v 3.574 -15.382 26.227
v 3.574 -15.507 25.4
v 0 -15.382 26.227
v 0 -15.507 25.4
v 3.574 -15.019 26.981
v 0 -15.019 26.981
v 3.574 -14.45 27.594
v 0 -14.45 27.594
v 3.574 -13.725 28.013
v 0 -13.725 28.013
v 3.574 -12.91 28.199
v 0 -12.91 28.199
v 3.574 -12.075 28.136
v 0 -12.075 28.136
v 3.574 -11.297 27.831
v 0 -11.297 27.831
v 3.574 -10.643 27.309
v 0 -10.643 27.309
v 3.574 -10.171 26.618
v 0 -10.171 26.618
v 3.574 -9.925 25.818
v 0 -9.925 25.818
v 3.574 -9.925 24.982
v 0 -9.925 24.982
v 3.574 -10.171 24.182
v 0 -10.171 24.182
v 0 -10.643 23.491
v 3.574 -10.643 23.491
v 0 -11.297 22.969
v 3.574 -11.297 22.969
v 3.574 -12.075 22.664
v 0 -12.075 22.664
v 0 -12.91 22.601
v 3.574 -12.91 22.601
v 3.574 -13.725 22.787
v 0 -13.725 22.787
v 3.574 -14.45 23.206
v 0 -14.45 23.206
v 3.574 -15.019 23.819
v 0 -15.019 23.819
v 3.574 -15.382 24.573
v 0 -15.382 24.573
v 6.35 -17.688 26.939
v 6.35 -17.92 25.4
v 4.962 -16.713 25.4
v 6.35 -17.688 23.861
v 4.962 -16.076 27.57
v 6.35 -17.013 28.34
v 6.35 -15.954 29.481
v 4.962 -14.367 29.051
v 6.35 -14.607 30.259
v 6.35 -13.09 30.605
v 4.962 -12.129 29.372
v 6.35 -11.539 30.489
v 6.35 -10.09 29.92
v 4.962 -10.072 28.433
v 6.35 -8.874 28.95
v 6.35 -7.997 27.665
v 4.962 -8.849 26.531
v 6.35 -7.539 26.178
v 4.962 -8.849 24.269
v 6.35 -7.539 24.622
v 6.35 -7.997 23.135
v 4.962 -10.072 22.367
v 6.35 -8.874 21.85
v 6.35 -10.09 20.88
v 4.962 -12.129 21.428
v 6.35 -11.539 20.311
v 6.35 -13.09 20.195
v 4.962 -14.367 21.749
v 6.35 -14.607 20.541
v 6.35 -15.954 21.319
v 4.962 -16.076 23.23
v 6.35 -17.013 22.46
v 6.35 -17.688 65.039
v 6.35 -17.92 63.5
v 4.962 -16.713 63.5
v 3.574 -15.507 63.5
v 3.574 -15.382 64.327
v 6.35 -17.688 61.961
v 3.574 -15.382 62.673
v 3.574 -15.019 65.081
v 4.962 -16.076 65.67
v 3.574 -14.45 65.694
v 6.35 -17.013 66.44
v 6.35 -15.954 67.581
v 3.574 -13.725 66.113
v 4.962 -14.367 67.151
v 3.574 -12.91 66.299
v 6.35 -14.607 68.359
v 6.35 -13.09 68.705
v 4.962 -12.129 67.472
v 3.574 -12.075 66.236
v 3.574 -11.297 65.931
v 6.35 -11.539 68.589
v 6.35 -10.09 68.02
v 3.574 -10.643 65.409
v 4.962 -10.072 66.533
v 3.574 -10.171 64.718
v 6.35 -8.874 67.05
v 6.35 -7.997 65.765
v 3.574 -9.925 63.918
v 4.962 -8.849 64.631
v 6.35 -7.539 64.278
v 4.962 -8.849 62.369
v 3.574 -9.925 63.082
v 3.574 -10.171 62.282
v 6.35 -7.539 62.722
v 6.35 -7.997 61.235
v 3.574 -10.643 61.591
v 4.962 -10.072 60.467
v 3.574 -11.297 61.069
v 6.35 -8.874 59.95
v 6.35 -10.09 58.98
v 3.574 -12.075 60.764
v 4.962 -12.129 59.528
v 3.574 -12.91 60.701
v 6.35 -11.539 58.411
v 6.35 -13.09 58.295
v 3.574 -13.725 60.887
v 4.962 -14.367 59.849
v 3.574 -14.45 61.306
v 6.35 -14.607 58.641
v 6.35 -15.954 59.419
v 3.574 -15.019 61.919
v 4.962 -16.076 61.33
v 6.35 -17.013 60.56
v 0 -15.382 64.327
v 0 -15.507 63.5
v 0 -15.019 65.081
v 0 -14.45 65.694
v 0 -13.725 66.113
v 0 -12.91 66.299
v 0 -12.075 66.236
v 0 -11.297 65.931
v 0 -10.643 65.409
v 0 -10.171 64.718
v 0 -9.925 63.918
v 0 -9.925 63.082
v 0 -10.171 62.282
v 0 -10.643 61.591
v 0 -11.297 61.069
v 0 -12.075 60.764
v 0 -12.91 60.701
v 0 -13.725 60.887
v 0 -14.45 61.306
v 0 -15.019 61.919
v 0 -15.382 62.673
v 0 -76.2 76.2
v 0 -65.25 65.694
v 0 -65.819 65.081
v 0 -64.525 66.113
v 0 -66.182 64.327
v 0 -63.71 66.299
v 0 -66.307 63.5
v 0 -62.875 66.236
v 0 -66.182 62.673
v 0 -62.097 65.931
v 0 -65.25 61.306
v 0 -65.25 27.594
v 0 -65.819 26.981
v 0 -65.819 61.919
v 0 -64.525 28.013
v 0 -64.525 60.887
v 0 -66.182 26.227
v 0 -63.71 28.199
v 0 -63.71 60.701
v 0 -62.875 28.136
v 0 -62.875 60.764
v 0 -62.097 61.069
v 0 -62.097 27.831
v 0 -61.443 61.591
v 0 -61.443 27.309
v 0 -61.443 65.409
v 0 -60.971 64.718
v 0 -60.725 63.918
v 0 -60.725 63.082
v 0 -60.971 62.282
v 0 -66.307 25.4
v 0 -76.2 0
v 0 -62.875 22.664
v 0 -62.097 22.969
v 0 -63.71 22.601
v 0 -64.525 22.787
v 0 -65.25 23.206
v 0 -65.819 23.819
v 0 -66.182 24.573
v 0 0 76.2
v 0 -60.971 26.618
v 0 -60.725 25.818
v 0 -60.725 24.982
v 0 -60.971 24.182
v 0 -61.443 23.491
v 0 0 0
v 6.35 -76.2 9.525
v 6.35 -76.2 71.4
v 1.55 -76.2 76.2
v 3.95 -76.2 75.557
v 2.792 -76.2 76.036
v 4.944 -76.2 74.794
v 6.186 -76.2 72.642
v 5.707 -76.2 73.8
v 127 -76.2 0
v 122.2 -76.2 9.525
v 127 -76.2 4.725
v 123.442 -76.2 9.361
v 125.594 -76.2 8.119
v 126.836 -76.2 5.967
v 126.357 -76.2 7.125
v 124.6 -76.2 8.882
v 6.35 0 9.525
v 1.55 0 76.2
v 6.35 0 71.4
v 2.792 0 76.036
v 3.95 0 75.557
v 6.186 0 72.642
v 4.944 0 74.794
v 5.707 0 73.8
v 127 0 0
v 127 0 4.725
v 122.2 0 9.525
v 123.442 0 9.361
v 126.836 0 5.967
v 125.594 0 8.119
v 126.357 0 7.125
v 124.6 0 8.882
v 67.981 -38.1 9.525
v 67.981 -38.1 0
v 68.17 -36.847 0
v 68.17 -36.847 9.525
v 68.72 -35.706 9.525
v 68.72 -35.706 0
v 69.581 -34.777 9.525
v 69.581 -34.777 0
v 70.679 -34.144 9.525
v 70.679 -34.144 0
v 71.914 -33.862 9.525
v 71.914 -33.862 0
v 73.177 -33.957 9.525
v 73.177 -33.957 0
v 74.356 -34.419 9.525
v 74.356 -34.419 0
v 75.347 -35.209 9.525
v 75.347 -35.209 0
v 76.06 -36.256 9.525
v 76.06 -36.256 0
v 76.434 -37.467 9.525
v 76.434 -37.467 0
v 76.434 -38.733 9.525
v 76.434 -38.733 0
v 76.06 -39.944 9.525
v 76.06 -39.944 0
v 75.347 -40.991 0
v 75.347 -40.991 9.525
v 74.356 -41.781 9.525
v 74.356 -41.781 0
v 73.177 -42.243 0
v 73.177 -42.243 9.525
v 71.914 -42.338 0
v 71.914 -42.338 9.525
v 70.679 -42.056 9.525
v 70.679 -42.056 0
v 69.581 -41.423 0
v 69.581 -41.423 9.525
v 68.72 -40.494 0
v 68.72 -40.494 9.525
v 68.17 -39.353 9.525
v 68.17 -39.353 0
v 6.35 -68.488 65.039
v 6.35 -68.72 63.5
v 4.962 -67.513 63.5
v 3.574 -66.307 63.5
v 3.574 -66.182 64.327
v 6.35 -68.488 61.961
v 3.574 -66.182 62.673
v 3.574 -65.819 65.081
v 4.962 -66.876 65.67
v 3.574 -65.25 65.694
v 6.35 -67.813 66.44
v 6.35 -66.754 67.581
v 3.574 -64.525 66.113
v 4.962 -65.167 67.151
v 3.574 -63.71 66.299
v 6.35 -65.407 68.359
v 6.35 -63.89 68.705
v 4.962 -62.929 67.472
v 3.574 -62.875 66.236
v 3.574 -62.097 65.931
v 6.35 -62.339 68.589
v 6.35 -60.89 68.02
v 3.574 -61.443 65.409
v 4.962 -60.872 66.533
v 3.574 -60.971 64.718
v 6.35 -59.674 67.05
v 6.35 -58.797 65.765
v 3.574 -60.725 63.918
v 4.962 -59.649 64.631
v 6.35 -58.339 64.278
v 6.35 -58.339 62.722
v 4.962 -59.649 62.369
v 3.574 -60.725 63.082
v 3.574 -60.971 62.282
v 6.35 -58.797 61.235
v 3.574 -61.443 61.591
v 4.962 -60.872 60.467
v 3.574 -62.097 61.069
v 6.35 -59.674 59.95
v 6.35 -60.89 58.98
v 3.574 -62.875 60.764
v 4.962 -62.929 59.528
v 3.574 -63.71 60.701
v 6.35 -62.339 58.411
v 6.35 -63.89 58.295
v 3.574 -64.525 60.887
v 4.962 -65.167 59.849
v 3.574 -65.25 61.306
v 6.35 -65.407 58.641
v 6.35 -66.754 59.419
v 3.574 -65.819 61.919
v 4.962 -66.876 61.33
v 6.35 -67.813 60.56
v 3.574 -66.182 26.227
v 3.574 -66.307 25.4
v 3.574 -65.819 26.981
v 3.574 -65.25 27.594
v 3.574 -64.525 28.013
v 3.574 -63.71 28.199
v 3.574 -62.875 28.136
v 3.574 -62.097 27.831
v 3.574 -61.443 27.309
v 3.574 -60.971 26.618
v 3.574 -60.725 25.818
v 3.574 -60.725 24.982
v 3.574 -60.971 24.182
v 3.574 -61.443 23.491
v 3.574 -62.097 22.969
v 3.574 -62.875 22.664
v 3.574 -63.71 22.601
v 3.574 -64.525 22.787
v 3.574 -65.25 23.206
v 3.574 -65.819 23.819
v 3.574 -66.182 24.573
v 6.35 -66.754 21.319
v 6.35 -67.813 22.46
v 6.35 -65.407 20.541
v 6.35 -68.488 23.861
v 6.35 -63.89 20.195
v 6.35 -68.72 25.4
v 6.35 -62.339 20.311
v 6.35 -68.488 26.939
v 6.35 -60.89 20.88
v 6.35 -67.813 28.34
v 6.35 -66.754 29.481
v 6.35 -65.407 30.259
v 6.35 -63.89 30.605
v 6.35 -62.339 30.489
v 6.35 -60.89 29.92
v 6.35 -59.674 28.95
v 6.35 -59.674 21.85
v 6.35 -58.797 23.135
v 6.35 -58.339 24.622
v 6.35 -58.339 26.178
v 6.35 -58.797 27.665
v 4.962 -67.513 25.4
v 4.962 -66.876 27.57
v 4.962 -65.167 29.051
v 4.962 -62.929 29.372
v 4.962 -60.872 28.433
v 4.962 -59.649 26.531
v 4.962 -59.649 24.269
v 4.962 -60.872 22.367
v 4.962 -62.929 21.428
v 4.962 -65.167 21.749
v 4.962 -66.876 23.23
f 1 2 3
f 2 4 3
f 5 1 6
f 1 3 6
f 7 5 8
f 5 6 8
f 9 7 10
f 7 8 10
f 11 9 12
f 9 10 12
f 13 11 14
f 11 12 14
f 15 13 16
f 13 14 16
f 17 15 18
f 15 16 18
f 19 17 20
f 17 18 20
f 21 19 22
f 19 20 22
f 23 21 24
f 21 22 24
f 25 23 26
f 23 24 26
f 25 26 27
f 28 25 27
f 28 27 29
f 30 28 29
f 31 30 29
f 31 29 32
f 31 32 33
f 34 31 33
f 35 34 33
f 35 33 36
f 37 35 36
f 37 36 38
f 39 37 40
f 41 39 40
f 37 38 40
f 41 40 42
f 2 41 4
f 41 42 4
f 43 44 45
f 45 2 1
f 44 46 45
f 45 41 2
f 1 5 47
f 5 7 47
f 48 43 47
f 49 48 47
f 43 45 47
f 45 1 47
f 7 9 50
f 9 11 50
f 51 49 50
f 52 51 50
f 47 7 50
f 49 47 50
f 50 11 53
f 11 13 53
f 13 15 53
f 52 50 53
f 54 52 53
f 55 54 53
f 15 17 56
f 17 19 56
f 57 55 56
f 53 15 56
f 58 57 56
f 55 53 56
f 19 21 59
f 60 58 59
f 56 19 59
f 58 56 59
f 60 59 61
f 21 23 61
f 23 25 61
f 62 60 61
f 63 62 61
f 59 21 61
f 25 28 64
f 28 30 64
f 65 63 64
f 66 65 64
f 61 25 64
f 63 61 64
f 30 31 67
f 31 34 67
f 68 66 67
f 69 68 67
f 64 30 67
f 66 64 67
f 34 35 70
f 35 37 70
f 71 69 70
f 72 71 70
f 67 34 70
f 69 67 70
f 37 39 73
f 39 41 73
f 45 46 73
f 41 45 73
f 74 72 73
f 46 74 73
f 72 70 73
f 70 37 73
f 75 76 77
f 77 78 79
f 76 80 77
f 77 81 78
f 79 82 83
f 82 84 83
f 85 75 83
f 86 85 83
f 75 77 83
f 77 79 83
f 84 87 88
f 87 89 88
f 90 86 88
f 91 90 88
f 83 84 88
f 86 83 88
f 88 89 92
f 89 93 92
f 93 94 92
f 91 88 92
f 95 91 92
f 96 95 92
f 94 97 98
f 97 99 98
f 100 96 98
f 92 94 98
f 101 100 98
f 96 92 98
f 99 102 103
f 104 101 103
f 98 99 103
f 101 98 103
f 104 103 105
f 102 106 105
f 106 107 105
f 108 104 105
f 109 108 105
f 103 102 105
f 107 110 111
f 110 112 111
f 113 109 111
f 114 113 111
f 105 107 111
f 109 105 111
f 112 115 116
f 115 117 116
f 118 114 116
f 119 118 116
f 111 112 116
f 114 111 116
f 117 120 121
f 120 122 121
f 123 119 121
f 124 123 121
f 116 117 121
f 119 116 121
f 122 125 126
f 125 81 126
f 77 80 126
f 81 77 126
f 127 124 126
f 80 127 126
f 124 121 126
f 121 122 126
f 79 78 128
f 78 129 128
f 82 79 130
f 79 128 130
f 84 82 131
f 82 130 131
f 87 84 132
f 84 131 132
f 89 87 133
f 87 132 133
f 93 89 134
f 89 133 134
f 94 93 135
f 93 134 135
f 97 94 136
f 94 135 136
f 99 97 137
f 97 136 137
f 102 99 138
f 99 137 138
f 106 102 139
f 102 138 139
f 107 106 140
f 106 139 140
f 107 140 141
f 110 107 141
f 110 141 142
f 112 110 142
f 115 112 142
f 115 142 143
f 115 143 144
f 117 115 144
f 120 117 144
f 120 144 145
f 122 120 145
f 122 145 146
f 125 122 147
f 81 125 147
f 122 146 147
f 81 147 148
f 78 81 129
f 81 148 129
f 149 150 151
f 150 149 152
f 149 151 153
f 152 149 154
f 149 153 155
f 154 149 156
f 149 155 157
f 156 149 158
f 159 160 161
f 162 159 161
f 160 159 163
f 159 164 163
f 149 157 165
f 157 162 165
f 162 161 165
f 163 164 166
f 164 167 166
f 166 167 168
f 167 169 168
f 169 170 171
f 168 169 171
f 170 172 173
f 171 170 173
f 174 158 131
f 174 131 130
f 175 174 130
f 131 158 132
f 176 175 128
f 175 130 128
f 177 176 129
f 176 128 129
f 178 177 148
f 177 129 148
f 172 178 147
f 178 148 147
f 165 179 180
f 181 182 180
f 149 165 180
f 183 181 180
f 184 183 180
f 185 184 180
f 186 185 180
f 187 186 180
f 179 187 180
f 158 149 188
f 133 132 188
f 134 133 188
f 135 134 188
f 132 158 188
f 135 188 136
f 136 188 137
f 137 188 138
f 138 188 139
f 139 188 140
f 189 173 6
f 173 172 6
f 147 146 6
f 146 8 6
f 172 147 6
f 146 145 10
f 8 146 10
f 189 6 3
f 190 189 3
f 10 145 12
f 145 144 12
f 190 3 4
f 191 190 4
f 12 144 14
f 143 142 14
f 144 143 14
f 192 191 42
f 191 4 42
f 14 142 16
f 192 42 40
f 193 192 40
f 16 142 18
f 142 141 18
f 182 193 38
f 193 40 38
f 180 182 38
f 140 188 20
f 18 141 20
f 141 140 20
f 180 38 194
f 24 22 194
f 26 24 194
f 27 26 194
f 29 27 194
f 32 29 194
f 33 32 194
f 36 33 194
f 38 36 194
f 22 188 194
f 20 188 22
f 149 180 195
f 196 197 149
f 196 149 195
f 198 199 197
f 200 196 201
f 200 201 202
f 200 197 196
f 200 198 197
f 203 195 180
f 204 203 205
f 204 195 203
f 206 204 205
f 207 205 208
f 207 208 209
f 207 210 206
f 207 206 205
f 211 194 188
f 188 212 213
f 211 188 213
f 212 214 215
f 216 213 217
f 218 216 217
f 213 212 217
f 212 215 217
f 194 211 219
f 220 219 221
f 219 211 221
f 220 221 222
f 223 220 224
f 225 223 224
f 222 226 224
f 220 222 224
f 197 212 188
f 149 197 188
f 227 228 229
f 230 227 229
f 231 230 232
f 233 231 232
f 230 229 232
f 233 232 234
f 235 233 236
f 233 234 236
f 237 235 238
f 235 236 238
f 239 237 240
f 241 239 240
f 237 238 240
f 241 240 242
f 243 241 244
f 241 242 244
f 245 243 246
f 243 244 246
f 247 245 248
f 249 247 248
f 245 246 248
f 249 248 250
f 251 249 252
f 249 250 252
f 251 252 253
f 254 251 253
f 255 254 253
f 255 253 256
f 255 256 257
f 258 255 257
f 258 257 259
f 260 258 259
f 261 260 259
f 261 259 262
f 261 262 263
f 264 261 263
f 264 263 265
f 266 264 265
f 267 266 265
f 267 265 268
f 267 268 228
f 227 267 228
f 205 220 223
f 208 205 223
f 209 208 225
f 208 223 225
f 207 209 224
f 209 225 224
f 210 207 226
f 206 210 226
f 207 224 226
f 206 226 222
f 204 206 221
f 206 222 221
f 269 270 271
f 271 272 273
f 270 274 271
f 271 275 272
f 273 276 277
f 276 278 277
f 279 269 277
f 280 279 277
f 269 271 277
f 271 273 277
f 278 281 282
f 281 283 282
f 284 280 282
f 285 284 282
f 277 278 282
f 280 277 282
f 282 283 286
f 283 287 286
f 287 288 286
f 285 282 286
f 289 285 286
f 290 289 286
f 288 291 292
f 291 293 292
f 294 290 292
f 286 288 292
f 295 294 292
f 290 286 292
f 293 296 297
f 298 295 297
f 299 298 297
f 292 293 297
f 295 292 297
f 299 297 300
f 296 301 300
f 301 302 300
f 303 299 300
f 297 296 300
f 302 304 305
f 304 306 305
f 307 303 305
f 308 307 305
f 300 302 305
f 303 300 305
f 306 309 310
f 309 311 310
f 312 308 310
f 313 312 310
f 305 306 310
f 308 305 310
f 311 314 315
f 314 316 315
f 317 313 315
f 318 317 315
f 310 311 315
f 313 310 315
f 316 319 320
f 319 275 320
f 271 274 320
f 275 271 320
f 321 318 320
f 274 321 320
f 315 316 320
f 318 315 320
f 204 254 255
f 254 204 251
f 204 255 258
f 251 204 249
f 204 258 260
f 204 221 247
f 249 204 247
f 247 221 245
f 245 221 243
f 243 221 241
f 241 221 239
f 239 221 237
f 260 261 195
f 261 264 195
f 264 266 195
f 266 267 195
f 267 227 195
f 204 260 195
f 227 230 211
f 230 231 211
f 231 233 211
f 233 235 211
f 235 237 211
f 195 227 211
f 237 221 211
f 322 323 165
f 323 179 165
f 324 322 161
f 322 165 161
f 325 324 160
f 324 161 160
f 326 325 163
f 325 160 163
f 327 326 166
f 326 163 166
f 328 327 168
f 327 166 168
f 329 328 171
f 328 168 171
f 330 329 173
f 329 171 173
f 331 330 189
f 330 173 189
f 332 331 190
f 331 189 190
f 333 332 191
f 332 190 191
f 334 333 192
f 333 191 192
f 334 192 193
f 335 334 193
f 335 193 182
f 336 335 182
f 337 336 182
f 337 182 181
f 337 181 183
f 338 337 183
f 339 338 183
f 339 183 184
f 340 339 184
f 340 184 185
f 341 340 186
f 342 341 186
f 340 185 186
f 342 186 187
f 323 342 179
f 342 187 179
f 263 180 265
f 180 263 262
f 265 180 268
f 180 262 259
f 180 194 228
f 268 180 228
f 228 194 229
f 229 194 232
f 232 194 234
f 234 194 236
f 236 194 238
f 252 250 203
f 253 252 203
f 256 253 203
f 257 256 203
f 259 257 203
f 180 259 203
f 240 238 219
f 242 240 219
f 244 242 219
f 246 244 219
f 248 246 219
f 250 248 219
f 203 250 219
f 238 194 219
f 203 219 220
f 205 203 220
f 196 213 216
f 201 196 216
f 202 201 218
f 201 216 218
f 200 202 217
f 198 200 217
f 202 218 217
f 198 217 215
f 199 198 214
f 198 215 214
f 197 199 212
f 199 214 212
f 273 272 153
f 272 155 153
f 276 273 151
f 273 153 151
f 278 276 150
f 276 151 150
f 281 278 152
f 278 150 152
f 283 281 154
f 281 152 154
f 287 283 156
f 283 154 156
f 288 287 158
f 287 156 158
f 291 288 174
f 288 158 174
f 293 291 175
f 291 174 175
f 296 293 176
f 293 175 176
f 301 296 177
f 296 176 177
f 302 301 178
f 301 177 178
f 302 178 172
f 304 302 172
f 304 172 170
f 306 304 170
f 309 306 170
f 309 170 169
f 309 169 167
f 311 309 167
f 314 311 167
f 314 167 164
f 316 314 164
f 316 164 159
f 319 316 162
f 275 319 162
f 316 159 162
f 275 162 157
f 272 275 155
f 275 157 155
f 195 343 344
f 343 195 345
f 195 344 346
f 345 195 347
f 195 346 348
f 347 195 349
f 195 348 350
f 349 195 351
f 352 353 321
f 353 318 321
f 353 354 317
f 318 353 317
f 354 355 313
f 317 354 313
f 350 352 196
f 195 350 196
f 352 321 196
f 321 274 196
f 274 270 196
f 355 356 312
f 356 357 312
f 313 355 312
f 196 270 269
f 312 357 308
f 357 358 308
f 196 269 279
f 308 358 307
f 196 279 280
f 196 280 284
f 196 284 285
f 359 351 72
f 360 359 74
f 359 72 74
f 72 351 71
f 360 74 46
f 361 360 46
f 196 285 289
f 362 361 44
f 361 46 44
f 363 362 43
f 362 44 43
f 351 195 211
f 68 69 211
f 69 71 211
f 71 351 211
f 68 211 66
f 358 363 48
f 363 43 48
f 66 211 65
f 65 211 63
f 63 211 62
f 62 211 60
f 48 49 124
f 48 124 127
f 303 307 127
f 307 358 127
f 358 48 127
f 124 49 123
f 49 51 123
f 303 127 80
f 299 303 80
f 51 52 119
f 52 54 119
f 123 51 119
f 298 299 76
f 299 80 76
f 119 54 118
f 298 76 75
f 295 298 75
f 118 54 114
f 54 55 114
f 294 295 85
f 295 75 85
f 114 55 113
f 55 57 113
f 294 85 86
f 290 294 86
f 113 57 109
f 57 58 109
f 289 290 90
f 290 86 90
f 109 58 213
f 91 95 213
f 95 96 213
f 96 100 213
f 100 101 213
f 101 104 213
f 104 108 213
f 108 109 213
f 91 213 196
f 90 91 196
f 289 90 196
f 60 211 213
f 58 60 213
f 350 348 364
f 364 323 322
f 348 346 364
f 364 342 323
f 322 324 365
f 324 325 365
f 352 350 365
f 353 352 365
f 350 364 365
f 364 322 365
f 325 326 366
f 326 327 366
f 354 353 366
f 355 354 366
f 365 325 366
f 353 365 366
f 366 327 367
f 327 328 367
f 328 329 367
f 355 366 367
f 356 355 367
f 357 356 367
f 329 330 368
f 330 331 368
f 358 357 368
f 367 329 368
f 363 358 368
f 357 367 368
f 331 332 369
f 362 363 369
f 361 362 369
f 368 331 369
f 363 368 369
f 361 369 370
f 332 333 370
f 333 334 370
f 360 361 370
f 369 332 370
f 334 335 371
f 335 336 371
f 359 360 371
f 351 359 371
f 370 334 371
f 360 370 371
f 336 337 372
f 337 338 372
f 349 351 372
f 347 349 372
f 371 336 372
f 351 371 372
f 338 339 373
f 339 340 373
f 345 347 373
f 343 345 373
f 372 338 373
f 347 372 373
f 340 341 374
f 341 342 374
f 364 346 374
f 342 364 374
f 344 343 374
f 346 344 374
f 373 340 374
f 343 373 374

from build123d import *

# Parameters (mm, degrees)
F1_DEPTH       = 76.2
F3_D           = 8.5
F5_D           = 5.6134
F5_CSINK_D     = 10.4394
F5_CSINK_ANGLE = 82


with BuildPart() as f1:
    # F0 (on Front) → F1 (new body)
    with BuildSketch(Plane.XZ):
        with BuildLine():
            Line((0, 76.2), (0, 0))
            Line((0, 0), (127, 0))
            Line((127, 0), (127, 4.725))
            ThreePointArc((127, 4.725), (125.5941125497, 8.1191125497), (122.2, 9.525))
            Line((122.2, 9.525), (6.35, 9.525))
            Line((6.35, 9.525), (6.35, 71.4))
            ThreePointArc((6.35, 71.4), (4.9441125497, 74.7941125497), (1.55, 76.2))
            Line((1.55, 76.2), (0, 76.2))
        make_face()
    extrude(amount=F1_DEPTH)

    # F3 (through all)
    with Locations(Plane.XY.offset(9.525)):
        with Locations((72.23125, -38.1)):
            Hole(F3_D / 2)

    # F5 (through all)
    with Locations(Plane.YZ.offset(6.35)):
        with Locations((-63.5, 63.5), (-63.5, 25.4), (-12.7, 25.4), (-12.7, 63.5)):
            CounterSinkHole(F5_D / 2, F5_CSINK_D / 2, counter_sink_angle=F5_CSINK_ANGLE)


solid = f1.part
